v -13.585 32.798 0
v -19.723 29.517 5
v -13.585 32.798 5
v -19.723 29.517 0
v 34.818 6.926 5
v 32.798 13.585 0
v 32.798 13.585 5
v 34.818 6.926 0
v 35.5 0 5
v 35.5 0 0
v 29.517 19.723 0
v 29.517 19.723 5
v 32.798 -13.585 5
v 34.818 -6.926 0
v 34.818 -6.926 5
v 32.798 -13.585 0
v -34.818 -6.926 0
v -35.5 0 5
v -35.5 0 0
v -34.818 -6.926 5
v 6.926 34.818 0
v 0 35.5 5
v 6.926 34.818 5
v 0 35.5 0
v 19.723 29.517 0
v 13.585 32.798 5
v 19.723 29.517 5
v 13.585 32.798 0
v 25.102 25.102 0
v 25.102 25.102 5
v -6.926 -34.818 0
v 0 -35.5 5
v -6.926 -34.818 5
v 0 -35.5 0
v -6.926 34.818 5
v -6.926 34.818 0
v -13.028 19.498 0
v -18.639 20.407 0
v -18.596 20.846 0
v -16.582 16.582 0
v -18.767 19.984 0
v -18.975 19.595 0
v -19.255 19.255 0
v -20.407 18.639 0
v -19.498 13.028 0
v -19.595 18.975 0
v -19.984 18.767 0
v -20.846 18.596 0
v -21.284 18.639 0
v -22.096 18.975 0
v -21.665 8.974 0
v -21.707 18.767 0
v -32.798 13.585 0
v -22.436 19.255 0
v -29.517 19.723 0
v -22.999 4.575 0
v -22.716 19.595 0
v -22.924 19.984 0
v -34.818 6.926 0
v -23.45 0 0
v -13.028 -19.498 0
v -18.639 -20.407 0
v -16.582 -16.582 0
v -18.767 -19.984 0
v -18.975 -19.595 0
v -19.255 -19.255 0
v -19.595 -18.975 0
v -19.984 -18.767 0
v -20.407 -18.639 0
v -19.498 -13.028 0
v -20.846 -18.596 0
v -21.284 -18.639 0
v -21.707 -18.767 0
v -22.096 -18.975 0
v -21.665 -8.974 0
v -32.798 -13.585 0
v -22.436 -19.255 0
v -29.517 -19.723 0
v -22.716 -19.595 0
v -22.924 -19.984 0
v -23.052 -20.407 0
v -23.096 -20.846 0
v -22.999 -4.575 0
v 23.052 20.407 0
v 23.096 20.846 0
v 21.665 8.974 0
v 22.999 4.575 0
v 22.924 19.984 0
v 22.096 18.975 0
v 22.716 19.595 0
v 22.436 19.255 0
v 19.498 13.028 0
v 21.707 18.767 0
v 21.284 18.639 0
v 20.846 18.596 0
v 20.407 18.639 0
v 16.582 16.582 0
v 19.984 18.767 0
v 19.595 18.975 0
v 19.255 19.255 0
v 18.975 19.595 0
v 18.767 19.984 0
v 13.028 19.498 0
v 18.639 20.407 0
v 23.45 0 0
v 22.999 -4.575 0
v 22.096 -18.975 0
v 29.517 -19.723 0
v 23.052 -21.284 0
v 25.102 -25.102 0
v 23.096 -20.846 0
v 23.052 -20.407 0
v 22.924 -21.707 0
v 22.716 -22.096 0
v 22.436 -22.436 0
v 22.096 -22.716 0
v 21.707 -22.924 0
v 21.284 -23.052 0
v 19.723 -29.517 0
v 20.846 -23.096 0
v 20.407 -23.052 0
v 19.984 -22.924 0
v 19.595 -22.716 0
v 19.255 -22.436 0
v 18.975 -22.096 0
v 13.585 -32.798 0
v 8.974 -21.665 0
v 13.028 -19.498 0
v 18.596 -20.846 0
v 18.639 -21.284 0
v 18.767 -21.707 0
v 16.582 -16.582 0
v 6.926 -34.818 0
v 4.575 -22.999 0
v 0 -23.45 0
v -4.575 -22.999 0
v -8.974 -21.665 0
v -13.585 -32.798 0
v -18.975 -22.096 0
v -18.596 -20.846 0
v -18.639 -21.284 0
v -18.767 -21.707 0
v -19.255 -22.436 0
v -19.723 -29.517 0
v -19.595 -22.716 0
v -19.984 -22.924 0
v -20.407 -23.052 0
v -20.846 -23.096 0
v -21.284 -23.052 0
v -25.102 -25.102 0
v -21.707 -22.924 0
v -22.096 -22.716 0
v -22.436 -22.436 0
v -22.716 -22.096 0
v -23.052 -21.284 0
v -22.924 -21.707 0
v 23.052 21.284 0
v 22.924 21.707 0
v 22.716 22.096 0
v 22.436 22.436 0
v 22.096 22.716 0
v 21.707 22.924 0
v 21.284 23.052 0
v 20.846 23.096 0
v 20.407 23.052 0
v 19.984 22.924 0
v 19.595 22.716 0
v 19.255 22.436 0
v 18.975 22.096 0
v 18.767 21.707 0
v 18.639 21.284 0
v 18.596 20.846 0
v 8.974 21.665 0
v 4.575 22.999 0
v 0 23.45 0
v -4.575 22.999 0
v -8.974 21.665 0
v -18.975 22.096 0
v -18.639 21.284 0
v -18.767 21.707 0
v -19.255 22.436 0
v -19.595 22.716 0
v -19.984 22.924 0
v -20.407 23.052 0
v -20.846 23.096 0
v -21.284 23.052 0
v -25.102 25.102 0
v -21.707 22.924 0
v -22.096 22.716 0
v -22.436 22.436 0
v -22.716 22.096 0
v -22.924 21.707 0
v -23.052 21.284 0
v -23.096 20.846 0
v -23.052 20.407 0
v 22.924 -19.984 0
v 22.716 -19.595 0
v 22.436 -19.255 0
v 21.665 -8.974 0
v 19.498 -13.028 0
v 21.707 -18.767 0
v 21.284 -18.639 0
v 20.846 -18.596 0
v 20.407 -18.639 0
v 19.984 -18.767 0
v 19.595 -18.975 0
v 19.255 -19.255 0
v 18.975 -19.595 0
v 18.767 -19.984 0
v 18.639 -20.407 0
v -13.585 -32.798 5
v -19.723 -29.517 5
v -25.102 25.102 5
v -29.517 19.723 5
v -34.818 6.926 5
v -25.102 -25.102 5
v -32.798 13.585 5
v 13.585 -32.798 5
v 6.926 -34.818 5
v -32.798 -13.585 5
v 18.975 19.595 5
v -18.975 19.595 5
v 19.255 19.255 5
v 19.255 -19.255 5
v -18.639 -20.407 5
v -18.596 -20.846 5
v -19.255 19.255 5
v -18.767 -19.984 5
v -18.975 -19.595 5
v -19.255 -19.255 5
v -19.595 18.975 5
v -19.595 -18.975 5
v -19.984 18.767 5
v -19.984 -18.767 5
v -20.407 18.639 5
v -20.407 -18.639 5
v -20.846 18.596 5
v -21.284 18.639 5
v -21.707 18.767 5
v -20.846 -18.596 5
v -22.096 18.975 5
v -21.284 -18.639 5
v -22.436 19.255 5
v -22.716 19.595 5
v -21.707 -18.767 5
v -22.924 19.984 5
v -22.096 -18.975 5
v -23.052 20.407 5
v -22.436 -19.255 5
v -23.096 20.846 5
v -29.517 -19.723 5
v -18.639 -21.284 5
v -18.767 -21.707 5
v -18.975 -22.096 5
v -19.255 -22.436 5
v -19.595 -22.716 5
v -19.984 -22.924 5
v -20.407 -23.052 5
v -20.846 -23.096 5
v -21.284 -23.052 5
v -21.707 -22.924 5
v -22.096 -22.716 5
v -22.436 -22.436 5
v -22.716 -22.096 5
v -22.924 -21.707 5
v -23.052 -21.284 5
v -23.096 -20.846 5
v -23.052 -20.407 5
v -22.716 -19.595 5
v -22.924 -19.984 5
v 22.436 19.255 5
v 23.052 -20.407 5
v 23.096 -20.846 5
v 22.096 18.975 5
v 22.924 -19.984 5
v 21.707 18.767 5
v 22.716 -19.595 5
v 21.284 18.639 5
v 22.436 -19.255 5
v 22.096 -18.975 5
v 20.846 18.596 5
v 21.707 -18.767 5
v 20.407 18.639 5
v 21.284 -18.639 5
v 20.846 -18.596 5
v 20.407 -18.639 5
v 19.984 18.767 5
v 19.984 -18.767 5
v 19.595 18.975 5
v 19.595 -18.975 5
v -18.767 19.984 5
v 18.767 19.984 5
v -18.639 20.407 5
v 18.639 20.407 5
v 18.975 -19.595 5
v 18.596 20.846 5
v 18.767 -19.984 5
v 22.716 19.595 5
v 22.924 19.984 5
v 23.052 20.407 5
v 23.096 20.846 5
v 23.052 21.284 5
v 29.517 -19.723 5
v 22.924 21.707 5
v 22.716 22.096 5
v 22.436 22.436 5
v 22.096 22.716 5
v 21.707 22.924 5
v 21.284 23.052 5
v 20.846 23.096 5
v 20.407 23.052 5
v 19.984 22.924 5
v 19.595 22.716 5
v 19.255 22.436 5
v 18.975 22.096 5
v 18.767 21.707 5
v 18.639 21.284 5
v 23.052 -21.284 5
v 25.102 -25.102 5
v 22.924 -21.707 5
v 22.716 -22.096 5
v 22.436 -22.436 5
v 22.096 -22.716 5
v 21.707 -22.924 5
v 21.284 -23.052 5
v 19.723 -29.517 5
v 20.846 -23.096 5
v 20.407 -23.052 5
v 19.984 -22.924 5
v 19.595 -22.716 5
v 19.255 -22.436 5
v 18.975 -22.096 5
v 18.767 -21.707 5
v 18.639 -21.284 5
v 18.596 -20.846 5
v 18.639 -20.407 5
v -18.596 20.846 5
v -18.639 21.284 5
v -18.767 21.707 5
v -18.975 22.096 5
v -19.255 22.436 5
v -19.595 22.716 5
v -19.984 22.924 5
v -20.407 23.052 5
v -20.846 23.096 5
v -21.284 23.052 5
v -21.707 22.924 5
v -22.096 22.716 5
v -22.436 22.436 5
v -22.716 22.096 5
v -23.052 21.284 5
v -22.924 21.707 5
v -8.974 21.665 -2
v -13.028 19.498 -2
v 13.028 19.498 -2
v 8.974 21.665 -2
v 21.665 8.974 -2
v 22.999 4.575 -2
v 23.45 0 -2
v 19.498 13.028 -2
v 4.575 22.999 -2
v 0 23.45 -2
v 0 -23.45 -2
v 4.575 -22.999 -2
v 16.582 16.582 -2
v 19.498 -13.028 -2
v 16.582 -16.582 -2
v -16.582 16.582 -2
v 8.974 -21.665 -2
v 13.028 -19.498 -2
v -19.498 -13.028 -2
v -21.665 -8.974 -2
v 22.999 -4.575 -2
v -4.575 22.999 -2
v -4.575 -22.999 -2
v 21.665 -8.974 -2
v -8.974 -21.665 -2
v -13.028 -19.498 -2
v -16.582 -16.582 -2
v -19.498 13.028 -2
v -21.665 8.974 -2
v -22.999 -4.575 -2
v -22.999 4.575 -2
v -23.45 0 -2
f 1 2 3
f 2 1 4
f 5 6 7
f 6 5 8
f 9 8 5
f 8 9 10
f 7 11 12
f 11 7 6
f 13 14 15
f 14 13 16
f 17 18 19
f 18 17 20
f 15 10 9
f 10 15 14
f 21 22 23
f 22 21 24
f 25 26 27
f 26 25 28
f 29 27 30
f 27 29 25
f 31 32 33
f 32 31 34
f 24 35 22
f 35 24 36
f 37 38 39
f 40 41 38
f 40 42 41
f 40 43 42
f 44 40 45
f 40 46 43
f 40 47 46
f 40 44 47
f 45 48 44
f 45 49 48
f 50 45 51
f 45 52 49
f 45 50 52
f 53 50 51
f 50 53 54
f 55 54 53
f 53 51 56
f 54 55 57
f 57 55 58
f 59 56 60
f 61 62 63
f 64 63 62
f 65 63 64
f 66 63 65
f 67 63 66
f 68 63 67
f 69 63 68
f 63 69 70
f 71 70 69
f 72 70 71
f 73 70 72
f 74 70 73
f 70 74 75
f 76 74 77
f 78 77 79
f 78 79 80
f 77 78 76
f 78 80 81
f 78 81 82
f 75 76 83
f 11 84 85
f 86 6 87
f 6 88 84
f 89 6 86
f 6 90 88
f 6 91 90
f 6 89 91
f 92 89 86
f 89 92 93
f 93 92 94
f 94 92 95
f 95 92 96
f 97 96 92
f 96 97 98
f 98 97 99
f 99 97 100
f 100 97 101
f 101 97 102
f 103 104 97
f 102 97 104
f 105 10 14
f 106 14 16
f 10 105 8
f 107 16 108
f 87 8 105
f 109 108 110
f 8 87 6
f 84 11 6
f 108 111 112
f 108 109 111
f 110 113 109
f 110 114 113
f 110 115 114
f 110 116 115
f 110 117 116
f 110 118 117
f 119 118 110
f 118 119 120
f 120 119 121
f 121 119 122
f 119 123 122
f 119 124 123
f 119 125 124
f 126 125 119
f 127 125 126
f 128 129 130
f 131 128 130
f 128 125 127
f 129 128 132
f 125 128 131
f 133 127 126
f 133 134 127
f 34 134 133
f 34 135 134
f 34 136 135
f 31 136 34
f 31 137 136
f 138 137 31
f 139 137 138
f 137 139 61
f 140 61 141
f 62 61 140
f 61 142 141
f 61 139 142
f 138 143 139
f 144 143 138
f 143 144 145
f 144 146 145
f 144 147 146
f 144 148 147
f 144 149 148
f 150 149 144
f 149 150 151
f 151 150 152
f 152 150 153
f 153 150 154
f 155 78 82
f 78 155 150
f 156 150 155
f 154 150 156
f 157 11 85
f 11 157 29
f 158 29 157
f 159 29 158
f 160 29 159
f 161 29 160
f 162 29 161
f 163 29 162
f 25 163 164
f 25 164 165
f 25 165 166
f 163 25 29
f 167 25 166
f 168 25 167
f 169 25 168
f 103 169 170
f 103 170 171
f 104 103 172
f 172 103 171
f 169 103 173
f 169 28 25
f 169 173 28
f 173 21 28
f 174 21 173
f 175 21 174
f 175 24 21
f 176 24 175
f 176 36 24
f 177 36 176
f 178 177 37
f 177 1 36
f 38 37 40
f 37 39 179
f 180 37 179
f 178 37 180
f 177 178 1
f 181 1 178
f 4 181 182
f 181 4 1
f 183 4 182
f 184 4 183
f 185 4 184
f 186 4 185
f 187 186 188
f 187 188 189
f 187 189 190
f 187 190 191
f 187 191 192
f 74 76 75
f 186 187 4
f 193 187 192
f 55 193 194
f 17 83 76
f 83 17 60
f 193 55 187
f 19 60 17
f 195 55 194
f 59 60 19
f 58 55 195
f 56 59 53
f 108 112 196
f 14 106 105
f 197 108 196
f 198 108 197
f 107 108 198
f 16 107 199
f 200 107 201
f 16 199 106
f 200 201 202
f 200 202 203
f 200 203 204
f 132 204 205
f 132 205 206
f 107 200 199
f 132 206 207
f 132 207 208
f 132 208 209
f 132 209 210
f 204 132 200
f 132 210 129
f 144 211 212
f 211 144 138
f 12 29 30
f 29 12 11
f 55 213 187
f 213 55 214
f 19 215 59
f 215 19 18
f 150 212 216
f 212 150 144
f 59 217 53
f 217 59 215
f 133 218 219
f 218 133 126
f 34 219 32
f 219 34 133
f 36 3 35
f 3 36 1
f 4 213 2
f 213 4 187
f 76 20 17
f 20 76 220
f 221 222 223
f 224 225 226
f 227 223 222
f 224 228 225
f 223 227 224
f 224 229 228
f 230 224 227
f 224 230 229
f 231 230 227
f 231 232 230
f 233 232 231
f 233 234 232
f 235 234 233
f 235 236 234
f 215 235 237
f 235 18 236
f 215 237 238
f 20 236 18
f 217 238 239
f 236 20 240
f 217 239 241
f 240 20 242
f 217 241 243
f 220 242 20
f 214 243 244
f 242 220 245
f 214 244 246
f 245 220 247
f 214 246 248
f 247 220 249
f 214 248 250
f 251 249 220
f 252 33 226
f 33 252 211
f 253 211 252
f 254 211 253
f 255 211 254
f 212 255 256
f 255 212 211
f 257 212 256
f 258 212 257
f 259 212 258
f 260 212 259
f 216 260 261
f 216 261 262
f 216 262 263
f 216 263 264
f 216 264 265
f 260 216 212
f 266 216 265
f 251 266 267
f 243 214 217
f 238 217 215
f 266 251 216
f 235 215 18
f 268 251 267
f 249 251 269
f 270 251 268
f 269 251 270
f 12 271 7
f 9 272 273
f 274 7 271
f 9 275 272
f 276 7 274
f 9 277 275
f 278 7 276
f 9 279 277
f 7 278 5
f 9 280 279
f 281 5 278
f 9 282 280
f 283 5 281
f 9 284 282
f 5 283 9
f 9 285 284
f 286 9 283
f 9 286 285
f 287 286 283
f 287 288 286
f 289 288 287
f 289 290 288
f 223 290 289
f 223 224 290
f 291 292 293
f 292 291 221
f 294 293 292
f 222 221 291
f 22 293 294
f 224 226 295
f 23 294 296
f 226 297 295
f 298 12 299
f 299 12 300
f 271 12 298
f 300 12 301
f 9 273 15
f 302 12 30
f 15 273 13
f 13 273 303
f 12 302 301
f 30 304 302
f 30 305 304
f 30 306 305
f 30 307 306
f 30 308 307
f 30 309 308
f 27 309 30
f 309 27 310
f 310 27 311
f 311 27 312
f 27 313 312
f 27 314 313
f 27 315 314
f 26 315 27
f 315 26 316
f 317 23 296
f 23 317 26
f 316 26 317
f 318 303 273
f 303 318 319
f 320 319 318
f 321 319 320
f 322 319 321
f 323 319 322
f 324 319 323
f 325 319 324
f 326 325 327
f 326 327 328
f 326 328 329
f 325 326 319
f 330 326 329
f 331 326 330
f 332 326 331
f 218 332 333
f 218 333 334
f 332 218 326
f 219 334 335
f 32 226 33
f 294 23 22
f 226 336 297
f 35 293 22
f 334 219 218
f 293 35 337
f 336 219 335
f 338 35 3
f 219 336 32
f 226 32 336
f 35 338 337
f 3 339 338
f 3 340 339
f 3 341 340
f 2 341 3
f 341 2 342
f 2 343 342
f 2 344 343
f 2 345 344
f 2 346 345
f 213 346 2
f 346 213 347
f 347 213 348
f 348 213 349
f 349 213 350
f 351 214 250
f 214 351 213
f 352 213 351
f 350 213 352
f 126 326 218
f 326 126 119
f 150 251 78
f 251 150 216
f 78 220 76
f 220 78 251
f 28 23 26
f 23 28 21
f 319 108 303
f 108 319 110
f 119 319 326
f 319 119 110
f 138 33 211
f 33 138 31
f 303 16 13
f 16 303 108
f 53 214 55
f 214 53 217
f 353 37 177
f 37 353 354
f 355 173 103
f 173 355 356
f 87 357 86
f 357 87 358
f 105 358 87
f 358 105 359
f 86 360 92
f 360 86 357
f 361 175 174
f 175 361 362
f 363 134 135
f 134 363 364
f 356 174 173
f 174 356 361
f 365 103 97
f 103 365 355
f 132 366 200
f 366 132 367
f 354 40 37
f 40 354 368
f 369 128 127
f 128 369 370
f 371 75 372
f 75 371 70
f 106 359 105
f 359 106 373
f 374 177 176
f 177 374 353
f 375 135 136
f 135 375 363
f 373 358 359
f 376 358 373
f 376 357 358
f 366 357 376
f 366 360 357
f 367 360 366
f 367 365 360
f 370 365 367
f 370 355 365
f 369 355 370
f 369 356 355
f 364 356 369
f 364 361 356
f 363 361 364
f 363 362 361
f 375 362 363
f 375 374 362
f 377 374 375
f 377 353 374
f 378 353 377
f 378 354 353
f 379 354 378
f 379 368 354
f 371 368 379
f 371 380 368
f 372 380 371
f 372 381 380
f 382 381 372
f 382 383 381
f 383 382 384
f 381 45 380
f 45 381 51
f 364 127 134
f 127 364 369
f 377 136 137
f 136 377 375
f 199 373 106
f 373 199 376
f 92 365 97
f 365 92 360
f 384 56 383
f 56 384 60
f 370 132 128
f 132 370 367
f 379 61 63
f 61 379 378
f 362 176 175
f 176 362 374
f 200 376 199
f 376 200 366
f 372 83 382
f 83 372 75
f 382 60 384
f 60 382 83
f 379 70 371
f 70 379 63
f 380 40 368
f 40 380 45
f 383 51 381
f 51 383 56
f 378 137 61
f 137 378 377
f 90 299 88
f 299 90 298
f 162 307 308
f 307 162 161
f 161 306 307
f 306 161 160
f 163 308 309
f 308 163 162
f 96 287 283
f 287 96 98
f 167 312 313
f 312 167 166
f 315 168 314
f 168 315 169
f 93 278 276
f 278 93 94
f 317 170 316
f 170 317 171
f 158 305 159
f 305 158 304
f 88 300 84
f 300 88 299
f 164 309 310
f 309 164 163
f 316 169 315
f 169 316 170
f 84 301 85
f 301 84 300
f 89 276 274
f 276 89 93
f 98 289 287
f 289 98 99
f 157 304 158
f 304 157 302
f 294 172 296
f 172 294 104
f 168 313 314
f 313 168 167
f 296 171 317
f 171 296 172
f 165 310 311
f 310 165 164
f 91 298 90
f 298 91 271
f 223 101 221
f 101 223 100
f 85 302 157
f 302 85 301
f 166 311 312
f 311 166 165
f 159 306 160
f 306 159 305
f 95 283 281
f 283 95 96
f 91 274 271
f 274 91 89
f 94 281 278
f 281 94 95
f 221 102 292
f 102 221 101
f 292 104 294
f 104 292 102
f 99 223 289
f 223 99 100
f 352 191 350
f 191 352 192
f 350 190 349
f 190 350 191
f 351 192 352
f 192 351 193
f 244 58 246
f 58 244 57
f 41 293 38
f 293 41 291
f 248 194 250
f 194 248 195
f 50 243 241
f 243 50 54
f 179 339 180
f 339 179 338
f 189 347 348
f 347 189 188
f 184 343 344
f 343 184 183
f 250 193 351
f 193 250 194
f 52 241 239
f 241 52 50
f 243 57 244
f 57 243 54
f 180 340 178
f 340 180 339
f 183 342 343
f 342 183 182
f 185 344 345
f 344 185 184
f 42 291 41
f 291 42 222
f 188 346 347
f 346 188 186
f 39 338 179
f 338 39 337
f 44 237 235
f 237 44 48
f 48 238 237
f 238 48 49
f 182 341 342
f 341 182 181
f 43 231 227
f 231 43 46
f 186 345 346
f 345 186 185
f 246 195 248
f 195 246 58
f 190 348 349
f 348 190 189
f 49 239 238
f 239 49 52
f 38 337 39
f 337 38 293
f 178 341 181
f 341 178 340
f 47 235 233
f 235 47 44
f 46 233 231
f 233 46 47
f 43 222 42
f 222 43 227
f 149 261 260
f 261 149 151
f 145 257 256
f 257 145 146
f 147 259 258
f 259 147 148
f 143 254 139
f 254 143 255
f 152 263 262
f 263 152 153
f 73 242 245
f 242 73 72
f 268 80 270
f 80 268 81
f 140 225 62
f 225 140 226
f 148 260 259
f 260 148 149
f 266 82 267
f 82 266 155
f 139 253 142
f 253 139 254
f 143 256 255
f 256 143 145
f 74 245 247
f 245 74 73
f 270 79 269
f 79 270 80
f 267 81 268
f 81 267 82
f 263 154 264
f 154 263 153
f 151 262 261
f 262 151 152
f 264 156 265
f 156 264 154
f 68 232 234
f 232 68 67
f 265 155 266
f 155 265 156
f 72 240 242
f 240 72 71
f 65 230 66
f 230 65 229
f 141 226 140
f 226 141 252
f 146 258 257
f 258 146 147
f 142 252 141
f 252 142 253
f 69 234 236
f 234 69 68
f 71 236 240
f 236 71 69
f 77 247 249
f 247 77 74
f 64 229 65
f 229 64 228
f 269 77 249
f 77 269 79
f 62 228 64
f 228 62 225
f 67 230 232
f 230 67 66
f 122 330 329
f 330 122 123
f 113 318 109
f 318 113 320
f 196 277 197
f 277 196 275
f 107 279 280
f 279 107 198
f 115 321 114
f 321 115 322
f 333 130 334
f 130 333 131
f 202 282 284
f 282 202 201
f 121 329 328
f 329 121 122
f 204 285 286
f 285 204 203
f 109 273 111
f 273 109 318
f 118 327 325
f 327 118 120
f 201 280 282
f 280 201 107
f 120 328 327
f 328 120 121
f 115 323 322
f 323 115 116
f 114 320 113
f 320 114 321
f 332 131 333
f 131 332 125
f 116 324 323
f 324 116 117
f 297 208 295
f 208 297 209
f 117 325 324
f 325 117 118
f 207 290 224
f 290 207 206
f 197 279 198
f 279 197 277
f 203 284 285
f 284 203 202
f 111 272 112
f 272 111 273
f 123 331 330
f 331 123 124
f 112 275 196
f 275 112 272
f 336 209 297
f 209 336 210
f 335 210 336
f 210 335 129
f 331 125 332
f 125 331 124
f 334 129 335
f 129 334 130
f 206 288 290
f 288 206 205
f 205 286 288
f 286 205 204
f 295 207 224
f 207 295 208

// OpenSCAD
$fn = 32;

// ----------------------------------------------------------------------
// Retaining cap: 6204 cover, 71 mm, spigot 46.9 mm
// ----------------------------------------------------------------------

// --- parameters (mm) ---
cover_d = 71;             // cover diameter
cover_t = 5;              // cover thickness
spigot_d = 46.9;          // spigot that enters the housing
spigot_h = 2;             // spigot height
bolt_d = 4.5;             // bolt clearance
bolt_r = 29.48;           // bolt circle radius

module cover() {
  cylinder(h = cover_t, d = cover_d);
}

module spigot() {
  /* sunk 1 mm into the cover; the spigot sets the overall height */
  translate([0, 0, -spigot_h]) cylinder(h = spigot_h + 1, d = spigot_d);
}

difference() {
  union() {
    cover();
    spigot();
  }
  for (i = [0 : 3]) rotate([0, 0, 45 + i * 90]) translate([bolt_r, 0, -spigot_h - 1])
    cylinder(h = spigot_h + cover_t + 2, d = bolt_d);
}
